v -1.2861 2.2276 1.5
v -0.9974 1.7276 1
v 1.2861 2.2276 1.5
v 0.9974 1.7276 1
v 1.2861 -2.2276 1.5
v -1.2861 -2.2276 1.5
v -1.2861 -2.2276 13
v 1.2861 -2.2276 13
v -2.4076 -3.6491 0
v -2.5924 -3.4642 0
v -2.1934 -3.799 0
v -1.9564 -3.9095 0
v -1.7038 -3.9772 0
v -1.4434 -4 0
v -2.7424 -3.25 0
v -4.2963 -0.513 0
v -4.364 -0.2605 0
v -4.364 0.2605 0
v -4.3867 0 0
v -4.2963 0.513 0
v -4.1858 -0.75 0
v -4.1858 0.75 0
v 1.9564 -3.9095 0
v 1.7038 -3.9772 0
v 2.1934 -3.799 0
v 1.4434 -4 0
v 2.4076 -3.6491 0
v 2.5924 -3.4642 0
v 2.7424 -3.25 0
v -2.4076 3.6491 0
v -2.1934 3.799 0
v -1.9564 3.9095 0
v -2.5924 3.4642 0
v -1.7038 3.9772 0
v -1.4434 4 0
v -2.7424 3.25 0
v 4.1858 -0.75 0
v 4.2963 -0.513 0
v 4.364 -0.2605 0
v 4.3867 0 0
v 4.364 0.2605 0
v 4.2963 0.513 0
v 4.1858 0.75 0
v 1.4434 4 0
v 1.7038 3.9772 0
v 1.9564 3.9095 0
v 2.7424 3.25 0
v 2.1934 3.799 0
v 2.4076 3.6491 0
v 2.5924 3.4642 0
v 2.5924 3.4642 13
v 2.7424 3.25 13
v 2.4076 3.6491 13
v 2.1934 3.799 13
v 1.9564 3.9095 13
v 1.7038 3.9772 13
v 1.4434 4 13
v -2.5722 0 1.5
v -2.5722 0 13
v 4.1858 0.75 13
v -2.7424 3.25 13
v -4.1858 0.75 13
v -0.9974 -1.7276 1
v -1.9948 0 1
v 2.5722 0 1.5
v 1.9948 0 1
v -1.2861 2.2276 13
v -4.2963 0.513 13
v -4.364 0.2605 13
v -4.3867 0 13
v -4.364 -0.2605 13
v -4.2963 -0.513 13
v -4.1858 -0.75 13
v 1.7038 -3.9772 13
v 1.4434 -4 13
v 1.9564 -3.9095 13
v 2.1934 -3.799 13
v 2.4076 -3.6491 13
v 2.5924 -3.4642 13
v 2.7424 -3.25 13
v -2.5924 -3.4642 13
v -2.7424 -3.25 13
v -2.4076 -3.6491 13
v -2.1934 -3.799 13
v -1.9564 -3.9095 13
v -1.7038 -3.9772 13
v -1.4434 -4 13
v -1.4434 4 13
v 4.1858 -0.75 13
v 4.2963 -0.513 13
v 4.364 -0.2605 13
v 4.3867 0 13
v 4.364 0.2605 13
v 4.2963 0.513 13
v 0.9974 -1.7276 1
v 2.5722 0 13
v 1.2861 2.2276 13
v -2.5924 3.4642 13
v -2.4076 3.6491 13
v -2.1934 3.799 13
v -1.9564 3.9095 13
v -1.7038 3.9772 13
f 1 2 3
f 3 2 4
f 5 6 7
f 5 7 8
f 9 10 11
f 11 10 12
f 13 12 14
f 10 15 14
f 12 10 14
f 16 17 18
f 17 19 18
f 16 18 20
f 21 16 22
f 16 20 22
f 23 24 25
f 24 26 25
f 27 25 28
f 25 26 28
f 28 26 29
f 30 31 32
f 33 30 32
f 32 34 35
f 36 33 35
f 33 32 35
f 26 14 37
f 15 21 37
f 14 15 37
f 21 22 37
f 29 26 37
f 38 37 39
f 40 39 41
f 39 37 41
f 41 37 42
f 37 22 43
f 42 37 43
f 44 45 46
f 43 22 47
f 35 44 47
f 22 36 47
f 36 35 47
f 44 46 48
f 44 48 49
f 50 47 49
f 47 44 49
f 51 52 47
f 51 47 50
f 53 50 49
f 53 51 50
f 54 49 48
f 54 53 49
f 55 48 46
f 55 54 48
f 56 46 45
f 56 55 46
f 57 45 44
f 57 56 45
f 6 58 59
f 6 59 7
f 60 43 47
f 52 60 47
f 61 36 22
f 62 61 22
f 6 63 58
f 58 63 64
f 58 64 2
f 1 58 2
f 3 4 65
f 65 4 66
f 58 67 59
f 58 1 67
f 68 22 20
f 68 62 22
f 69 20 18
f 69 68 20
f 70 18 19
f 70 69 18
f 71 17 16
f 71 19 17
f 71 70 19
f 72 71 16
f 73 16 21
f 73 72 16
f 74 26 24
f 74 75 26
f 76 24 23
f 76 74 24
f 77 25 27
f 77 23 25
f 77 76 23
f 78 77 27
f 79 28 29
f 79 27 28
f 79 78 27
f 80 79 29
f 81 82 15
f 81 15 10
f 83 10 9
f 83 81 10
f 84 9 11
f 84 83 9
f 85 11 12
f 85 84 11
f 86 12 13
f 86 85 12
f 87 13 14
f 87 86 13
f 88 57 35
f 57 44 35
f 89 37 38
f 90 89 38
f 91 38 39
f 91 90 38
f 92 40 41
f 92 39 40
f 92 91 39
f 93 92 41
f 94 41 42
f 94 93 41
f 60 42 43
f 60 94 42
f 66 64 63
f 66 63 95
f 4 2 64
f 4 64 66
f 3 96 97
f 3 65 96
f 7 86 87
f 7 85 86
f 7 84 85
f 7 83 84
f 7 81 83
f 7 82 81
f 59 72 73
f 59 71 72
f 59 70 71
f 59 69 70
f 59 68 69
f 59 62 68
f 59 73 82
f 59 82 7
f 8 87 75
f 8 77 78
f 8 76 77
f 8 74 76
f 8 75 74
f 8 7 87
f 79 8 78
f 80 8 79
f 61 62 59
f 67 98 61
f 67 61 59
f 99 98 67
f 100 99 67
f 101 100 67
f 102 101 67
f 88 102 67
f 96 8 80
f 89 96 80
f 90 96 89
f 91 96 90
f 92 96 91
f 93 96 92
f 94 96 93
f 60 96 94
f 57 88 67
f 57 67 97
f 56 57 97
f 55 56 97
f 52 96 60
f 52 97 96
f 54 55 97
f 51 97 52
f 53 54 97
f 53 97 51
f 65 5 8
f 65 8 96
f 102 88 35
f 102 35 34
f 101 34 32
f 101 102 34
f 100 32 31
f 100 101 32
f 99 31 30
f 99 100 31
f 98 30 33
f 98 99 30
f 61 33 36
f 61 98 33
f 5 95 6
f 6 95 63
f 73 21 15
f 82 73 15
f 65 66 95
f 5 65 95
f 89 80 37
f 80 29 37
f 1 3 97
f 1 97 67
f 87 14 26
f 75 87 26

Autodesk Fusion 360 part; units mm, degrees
sketch "Sketch1" plane through (0, 0, 0) normal (0, 0, 1) x (1, 0, 0)
  line L0 (-1.2861, 2.2276) -> (-2.5722, 0)
  line L1 (-2.5722, 0) -> (-1.2861, -2.2276)
  line L2 (-1.2861, -2.2276) -> (1.2861, -2.2276)
  line L3 (1.2861, -2.2276) -> (2.5722, 0)
  line L4 (2.5722, 0) -> (1.2861, 2.2276)
  line L5 (1.2861, 2.2276) -> (-1.2861, 2.2276)
  line L6 (-2.3094, 4) -> (-4.6188, 0)
  line L7 (-4.6188, 0) -> (-2.3094, -4)
  line L8 (-2.3094, -4) -> (2.3094, -4)
  line L9 (2.3094, -4) -> (4.6188, 0)
  line L10 (4.6188, 0) -> (2.3094, 4)
  line L11 (2.3094, 4) -> (-2.3094, 4)
extrude "Extrude1" add sketch "Sketch1" along normal blind 13
extrude "Extrude2" add sketch "Sketch1" along normal blind 1 contours L0 L1 L2 L3 L4 L5
chamfer "Chamfer1" distance 0.5 angle 45 6 edges at (1.9291, -1.1138, 1) (1.9291, 1.1138, 1) (0, 2.2276, 1) (-1.9291, 1.1138, 1) (-1.9291, -1.1138, 1) (0, -2.2276, 1)
fillet "Fillet1" radius 1.5 6 edges at (2.3094, 4, 6.5) (-2.3094, 4, 6.5) (-4.6188, 0, 6.5) (-2.3094, -4, 6.5) (2.3094, -4, 6.5) (4.6188, 0, 6.5)
